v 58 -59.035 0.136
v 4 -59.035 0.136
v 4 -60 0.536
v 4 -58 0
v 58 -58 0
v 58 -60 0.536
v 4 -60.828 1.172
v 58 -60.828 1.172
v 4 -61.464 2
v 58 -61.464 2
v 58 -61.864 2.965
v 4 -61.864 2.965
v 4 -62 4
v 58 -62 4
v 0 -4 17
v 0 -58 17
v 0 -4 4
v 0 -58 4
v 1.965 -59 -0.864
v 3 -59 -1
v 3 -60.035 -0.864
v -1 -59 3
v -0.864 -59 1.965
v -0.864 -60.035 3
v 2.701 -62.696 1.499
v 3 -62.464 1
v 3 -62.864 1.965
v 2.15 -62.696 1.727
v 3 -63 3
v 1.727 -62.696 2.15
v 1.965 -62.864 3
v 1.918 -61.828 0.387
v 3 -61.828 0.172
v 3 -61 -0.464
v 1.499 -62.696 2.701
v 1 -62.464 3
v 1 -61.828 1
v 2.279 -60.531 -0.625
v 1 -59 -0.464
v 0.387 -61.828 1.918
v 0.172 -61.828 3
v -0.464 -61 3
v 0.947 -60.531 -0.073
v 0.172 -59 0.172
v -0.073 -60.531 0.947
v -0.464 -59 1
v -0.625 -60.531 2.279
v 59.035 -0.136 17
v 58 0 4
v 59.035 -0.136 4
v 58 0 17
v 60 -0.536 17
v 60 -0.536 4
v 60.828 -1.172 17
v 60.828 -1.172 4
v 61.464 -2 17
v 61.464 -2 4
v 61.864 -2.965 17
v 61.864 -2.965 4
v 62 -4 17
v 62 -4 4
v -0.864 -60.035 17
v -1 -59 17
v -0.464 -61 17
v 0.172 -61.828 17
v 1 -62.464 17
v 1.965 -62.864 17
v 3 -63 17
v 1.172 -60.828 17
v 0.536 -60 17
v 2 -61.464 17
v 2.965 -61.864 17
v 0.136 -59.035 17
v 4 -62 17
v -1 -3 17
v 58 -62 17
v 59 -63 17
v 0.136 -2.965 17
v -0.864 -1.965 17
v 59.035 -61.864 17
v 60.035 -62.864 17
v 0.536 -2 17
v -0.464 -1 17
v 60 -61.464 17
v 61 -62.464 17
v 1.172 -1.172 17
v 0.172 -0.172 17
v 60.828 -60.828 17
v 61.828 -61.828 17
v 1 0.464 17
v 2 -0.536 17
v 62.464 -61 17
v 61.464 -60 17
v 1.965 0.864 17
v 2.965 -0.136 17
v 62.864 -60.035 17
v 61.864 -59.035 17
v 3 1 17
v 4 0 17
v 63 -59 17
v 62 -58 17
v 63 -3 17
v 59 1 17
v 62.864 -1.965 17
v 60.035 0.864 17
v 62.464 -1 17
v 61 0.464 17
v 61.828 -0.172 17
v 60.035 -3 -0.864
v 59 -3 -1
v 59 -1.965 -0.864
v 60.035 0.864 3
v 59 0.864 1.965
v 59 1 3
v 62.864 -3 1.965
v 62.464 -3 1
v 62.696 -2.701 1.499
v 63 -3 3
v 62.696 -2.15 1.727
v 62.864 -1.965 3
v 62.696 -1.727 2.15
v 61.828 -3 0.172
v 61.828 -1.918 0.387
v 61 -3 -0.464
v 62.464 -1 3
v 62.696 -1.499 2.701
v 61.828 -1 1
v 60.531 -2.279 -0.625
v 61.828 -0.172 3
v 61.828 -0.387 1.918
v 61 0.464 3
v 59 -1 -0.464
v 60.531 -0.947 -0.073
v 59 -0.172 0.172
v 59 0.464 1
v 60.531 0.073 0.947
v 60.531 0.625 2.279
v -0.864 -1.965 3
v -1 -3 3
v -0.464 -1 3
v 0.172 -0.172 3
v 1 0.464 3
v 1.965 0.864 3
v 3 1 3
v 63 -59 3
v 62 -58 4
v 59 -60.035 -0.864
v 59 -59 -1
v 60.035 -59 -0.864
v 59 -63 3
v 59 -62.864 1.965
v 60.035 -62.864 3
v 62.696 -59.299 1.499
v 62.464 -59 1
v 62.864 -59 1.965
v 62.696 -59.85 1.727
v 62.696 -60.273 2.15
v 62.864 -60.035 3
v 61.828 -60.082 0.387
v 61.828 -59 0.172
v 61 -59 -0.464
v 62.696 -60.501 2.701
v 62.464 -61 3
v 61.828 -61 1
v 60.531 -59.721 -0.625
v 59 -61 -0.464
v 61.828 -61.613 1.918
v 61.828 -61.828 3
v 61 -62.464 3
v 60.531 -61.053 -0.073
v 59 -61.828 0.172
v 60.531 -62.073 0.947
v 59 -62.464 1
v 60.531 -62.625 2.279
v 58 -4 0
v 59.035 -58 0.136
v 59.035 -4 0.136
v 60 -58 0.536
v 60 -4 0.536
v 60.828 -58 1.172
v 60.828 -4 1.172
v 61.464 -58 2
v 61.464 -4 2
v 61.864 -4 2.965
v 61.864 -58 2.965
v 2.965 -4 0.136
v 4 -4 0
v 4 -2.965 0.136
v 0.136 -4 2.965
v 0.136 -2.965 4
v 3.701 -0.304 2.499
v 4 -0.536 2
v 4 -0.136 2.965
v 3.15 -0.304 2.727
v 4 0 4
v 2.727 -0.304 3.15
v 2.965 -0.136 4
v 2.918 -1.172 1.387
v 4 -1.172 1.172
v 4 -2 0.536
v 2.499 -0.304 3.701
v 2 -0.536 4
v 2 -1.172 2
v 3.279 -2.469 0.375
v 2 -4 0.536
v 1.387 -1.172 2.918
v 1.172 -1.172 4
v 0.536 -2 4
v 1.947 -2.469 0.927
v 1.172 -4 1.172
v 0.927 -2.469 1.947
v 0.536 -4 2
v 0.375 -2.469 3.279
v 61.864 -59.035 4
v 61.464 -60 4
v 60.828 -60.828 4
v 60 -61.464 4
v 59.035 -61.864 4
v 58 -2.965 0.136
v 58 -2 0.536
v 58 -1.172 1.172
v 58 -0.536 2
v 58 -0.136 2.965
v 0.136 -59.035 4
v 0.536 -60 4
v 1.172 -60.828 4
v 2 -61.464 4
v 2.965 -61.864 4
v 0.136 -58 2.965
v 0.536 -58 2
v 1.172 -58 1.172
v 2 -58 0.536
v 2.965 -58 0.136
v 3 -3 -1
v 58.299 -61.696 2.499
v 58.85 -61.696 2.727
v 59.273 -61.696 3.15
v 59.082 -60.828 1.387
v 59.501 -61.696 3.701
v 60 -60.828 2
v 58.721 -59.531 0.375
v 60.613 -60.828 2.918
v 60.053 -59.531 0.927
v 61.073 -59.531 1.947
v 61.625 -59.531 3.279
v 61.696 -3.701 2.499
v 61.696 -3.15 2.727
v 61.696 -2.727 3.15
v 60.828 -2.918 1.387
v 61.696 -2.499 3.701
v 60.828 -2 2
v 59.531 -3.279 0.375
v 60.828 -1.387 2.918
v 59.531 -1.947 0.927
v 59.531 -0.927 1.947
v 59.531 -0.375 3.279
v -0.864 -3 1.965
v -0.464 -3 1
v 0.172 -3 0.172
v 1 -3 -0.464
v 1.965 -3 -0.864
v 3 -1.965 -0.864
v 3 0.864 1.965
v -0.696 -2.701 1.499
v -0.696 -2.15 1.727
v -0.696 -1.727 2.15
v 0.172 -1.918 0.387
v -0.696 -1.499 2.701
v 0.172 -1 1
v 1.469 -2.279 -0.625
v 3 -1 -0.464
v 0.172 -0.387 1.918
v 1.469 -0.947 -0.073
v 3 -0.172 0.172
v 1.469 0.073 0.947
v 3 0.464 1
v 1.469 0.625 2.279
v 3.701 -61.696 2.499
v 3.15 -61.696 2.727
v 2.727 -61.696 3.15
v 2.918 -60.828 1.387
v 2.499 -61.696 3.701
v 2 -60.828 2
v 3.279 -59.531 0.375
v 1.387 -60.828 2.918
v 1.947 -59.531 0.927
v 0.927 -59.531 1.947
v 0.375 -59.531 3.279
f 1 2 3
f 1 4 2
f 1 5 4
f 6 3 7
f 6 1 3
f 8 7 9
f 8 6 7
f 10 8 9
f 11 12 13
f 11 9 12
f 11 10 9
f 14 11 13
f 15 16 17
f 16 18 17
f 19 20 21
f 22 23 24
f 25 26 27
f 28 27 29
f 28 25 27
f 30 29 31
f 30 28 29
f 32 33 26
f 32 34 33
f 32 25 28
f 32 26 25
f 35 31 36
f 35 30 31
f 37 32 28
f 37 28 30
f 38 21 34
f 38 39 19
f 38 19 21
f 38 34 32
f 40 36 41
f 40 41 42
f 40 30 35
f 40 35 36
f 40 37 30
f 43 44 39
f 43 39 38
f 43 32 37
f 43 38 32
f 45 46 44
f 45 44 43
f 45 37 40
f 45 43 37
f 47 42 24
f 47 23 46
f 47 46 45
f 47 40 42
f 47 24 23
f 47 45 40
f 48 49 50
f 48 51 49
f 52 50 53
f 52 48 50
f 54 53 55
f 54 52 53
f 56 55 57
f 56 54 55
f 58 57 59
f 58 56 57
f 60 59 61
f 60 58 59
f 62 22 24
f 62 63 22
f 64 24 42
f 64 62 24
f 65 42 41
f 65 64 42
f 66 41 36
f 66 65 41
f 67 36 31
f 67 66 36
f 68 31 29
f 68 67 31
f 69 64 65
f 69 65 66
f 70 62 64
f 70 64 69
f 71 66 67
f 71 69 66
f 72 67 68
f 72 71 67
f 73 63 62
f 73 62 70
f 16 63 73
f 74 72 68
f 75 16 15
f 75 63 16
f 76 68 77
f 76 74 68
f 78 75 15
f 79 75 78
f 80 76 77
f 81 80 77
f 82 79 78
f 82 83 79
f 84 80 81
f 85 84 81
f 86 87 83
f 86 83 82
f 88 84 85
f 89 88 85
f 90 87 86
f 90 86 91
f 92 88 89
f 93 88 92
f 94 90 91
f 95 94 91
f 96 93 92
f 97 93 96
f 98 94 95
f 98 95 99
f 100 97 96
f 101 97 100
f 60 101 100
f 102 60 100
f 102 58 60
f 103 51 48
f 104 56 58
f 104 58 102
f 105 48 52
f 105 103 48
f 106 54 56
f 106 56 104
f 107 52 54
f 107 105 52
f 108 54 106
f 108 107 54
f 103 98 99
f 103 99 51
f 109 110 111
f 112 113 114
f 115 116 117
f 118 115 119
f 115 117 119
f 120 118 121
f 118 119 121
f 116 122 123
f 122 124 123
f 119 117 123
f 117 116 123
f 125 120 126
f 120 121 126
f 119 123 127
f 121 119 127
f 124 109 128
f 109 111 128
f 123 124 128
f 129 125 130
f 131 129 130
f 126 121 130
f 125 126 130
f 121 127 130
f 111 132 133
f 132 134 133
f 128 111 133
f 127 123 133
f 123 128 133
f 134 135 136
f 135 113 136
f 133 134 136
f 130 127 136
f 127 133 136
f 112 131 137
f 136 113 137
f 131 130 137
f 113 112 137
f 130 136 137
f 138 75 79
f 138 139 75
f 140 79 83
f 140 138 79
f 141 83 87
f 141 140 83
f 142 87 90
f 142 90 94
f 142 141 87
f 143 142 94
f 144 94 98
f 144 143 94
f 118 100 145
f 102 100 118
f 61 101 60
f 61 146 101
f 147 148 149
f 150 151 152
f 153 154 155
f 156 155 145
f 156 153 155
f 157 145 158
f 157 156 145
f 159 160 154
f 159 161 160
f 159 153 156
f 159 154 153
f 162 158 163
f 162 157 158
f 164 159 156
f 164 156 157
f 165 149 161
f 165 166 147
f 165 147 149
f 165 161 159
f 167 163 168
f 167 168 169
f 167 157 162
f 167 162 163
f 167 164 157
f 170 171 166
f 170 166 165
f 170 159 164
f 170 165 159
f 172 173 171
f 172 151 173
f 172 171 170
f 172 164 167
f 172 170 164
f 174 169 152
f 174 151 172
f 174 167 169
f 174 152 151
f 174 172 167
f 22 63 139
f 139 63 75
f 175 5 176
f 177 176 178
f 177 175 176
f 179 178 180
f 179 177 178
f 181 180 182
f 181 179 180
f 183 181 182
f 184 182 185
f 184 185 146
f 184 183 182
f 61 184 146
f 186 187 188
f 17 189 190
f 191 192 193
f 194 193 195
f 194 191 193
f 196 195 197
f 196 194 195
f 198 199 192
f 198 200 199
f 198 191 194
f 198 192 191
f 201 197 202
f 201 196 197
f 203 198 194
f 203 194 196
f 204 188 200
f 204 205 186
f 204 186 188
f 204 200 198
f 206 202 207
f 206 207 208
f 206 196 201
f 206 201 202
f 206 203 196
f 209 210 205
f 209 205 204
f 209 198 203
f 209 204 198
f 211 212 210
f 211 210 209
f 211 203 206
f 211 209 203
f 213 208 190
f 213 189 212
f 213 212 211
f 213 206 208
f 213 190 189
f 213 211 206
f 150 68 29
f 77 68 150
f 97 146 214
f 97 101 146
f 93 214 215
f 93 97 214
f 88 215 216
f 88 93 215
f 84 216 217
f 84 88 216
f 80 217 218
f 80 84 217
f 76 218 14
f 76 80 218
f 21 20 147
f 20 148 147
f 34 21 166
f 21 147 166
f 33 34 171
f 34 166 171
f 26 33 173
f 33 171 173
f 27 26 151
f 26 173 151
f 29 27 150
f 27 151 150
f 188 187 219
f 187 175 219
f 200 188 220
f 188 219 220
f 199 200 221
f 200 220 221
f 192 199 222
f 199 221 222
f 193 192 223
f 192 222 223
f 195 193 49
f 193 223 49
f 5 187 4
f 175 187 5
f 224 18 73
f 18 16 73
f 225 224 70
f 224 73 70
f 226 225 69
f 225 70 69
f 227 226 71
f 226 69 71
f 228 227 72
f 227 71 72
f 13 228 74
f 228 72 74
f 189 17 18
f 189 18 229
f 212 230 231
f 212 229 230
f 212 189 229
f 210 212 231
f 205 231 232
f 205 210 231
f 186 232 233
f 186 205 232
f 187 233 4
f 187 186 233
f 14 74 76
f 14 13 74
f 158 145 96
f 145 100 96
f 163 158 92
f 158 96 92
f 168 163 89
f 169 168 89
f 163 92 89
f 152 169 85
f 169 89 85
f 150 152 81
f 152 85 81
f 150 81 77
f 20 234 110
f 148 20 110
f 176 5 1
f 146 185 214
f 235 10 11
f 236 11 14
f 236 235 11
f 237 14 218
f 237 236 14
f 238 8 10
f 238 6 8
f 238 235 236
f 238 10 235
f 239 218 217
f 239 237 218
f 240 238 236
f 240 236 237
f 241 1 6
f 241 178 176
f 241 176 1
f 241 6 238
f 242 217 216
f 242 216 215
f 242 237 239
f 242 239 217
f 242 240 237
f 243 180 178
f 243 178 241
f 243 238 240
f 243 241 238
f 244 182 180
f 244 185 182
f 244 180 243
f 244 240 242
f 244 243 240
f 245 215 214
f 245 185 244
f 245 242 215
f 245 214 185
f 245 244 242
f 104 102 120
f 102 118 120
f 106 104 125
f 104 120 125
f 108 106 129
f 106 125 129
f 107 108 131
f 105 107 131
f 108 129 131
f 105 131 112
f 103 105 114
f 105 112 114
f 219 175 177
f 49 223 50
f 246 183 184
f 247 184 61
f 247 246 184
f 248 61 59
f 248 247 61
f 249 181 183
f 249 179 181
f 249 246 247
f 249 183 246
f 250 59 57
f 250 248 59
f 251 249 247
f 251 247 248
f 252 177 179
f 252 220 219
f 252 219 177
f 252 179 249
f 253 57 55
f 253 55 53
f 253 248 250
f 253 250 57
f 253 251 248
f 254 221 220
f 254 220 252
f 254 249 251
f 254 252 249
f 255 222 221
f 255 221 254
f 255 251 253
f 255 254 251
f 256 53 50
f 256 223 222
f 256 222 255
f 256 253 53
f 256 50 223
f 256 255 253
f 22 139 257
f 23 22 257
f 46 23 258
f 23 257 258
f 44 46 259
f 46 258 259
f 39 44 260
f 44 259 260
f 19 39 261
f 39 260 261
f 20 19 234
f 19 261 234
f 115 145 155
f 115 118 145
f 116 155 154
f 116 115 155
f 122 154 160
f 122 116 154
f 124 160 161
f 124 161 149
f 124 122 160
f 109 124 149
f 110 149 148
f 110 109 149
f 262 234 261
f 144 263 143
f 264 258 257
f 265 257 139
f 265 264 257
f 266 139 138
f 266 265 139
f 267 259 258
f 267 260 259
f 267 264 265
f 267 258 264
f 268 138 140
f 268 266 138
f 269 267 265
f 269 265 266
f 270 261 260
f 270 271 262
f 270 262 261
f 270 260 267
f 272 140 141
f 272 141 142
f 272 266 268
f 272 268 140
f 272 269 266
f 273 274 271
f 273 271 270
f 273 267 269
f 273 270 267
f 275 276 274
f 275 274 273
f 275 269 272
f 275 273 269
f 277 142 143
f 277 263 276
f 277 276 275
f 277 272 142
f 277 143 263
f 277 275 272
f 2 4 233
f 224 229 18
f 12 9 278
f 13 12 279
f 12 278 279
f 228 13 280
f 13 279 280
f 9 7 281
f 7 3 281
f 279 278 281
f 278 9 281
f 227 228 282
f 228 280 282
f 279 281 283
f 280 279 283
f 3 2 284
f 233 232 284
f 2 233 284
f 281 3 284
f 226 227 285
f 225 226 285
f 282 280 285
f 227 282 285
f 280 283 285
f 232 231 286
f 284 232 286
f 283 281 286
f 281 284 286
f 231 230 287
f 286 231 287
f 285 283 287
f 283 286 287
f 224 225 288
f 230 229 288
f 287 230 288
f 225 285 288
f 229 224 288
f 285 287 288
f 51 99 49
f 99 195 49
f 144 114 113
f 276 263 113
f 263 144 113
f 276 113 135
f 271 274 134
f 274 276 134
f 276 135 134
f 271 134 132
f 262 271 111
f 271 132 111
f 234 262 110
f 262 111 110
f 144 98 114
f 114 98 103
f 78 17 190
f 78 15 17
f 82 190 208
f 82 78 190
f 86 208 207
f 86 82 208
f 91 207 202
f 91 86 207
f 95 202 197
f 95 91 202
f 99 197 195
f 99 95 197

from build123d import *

# Parameters (mm, degrees)
F2_W     = 64
F2_H     = 64
F2_W_2   = 62
F2_H_2   = 62
F3_DEPTH = 17
F4_DEPTH = 1
F5_R     = 4


with BuildPart() as f3:
    # F2 (on Top) → F3 (new body)
    with BuildSketch(Plane.XY):
        with Locations((31, -31)):
            Rectangle(F2_W, F2_H)
        with Locations((31, -31)):
            Rectangle(F2_W_2, F2_H_2, mode=Mode.SUBTRACT)
    extrude(amount=F3_DEPTH)

    # F2 (on Top) → F4 (join)
    with BuildSketch(Plane.XY):
        with Locations((31, -31)):
            Rectangle(F2_W, F2_H)
        with Locations((31, -31)):
            Rectangle(F2_W_2, F2_H_2, mode=Mode.SUBTRACT)
        with Locations((31, -31)):
            Rectangle(F2_W_2, F2_H_2)
    extrude(amount=-F4_DEPTH)

    # F5
    f5_edges = [f3.edges().sort_by_distance(p)[0] for p in [
        (0, -31, 0),
        (31, 0, 0),
        (62, -31, 0),
        (31, -62, 0),
        (31, 1, -1),
        (-1, -31, -1),
        (31, -63, -1),
        (63, -31, -1),
        (0, -62, 8.5),
        (0, 0, 8.5),
        (62, 0, 8.5),
        (62, -62, 8.5),
        (-1, 1, 8),
        (63, 1, 8),
        (63, -63, 8),
        (-1, -63, 8),
    ]]
    fillet(f5_edges, radius=F5_R)


solid = f3.part
